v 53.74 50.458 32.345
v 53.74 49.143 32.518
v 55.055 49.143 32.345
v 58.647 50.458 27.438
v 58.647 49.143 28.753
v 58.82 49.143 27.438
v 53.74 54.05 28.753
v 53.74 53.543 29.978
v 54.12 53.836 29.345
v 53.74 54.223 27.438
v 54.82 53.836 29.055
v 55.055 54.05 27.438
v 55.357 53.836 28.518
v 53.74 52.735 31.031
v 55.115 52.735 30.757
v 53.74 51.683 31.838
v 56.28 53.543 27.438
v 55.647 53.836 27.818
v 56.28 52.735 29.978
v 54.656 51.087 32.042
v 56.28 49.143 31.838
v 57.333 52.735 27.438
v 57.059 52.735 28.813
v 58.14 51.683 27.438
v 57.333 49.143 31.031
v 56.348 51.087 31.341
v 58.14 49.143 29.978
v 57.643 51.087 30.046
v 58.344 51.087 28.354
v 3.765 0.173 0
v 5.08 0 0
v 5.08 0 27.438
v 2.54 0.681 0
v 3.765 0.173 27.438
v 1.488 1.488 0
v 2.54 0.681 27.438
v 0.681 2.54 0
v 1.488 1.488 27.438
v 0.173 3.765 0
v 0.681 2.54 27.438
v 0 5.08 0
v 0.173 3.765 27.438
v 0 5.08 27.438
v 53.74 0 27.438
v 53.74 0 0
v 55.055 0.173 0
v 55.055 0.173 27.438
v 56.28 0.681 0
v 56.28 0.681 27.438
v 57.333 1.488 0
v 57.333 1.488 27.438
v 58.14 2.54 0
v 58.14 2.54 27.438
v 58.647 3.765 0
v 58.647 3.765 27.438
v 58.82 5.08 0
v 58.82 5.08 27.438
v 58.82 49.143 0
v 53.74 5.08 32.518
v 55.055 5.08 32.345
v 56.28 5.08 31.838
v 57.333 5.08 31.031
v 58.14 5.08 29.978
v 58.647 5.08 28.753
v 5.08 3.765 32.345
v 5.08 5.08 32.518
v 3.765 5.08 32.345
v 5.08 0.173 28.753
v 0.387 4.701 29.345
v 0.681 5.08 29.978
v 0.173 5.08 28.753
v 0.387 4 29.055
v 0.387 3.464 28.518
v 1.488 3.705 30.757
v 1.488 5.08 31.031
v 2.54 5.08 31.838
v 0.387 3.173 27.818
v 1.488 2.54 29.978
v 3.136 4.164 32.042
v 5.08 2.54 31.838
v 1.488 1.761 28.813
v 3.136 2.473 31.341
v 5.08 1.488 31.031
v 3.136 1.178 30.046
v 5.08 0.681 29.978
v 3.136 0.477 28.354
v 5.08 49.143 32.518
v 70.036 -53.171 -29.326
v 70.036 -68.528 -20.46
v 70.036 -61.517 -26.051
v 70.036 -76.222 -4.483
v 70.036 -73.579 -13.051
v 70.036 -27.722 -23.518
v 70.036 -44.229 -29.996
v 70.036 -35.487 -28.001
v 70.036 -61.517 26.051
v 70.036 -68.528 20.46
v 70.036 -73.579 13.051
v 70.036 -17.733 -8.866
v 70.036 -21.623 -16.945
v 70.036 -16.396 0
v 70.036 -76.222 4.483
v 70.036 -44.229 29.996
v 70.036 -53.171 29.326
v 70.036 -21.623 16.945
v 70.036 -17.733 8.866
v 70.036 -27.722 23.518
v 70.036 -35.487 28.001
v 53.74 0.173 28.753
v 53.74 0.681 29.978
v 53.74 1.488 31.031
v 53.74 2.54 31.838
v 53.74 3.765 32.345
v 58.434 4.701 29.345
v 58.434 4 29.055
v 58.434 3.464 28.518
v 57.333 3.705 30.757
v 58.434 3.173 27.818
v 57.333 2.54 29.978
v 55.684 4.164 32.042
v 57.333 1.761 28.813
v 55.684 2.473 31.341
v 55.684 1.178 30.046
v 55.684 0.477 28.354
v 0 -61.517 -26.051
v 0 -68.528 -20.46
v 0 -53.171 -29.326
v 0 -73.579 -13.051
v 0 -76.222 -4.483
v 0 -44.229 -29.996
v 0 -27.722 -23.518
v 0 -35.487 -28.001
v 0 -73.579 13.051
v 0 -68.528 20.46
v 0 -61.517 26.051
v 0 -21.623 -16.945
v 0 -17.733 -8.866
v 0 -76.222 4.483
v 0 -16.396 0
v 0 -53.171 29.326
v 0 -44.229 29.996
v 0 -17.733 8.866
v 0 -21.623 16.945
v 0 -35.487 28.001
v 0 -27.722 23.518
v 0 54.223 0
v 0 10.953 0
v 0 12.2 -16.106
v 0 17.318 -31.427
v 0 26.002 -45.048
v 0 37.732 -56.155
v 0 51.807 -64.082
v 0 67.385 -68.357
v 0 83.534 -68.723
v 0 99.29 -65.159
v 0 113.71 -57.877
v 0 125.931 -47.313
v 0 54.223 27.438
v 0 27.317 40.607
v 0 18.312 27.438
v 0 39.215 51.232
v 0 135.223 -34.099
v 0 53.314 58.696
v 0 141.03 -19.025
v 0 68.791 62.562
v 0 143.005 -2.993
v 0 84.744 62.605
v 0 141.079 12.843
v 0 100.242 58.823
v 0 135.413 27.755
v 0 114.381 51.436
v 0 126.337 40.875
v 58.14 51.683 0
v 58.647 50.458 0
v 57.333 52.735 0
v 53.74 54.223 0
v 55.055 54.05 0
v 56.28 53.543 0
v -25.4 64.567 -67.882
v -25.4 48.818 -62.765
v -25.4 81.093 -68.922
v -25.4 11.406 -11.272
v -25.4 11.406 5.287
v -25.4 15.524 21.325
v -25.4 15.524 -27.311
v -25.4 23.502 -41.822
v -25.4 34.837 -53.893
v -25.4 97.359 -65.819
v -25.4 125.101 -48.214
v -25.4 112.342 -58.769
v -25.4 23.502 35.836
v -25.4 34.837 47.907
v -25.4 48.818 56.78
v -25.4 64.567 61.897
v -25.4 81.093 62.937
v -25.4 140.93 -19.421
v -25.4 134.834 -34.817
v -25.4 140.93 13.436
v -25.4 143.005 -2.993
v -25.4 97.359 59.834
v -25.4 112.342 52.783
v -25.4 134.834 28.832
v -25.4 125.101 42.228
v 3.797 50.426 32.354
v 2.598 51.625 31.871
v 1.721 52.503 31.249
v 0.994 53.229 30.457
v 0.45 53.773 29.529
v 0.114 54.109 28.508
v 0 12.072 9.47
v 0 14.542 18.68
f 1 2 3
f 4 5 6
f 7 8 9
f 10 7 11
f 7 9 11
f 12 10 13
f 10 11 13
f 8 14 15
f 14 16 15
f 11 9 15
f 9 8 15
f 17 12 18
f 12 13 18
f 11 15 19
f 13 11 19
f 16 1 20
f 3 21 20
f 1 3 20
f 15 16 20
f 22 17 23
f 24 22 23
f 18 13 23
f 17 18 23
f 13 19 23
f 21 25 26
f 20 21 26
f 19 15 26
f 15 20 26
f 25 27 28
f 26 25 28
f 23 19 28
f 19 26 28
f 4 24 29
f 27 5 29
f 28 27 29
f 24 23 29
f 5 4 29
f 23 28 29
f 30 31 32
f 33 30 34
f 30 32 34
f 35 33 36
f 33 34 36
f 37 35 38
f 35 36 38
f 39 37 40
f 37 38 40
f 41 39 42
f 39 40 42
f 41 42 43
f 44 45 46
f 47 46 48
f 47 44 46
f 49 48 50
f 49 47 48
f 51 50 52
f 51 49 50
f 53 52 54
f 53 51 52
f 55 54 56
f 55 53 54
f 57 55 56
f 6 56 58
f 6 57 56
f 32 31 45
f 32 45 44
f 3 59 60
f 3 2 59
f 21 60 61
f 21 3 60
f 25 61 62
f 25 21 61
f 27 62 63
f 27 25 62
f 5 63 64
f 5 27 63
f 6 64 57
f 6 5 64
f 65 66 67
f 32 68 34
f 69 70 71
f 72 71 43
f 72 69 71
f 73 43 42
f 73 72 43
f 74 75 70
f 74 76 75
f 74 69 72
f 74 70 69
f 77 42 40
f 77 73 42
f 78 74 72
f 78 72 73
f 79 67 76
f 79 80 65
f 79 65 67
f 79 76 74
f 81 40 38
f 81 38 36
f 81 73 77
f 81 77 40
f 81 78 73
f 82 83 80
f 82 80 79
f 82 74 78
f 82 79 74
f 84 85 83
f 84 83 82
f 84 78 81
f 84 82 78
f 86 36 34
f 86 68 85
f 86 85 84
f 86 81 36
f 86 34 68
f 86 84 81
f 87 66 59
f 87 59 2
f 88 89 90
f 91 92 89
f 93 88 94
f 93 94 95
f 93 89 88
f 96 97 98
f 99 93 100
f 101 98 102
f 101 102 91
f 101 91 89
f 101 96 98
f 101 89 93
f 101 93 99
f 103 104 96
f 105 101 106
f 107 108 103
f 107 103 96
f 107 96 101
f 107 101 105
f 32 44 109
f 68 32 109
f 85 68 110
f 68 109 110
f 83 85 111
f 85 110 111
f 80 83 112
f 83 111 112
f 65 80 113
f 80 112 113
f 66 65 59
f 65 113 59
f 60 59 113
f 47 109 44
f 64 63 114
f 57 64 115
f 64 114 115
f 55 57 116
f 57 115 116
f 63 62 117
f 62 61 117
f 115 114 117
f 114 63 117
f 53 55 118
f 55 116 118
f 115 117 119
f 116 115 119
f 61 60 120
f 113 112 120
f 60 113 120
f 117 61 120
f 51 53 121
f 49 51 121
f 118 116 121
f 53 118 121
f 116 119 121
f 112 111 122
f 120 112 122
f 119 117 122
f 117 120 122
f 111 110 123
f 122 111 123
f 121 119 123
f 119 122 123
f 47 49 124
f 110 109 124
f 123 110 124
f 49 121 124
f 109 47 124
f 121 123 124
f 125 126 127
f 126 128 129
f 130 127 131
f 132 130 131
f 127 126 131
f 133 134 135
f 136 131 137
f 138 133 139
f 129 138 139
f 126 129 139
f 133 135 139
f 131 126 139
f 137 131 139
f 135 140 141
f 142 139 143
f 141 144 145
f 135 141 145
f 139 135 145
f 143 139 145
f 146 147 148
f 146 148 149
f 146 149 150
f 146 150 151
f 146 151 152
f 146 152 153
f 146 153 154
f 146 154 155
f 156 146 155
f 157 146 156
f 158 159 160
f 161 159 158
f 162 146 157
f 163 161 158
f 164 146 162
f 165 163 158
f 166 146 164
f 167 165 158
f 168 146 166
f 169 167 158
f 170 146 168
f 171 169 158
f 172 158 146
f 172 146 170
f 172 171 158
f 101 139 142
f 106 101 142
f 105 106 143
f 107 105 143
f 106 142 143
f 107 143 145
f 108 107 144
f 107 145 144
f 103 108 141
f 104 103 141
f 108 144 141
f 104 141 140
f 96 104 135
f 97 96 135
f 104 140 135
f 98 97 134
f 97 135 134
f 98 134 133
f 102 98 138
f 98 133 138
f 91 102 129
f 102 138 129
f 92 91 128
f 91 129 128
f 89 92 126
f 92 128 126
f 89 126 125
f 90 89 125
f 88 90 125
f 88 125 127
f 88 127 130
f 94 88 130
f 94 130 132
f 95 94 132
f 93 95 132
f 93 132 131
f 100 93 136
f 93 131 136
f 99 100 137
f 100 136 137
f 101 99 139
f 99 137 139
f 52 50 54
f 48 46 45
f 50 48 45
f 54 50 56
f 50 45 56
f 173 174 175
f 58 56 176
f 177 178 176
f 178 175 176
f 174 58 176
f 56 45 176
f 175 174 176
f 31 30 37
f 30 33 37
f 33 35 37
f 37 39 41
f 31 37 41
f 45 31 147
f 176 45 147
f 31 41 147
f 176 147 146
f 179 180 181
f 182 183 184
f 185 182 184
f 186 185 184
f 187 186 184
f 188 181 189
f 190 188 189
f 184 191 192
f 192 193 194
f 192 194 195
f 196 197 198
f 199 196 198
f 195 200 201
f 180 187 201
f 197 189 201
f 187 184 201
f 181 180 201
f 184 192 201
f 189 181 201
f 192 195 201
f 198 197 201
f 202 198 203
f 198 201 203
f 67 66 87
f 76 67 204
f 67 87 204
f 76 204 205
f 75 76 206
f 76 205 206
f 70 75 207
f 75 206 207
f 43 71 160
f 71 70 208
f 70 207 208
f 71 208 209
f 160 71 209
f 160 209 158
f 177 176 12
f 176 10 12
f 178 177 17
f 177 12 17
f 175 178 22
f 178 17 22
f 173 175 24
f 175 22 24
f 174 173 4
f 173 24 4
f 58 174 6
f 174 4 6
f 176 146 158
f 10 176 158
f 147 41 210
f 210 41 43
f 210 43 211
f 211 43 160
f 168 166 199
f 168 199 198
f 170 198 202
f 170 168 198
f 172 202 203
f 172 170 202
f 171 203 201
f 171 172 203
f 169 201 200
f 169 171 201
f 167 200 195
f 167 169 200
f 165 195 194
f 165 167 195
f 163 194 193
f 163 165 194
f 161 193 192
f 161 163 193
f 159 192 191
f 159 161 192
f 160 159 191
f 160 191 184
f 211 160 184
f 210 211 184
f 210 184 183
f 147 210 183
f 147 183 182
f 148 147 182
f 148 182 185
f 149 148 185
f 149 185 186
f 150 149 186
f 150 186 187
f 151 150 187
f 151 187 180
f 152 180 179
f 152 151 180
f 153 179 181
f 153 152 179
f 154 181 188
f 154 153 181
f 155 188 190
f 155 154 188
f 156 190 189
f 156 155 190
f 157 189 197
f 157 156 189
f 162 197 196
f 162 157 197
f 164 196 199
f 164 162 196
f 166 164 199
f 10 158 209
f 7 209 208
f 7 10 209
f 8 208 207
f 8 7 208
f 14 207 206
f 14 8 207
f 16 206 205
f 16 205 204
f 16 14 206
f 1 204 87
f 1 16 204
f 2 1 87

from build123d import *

# Parameters (mm, degrees)
F0_W     = 54.223113
F0_H     = 32.518405
F1_DEPTH = 58.82041
F2_R     = 5.08
F3_R     = 30.080607
F4_DEPTH = 70.0362
F5_R     = 66.059765
F6_DEPTH = 25.4


with BuildPart() as f1:
    # F0 (on Right) → F1 (new body)
    with BuildSketch(Plane.YZ):
        with Locations((27.111556, 16.259203)):
            Rectangle(F0_W, F0_H)
    extrude(amount=F1_DEPTH)

    # F2
    f2_edges = [f1.edges().sort_by_distance(p)[0] for p in [
        (29.410205, 0, 32.518405),
        (58.82041, 27.111556, 32.518405),
        (29.410205, 54.223113, 32.518405),
        (0, 27.111556, 32.518405),
        (58.82041, 0, 16.259203),
        (58.82041, 54.223113, 16.259203),
        (0, 0, 16.259203),
    ]]
    fillet(f2_edges, radius=F2_R)

    # F5 (on Right) → F6 (join)
    with BuildSketch(Plane.YZ):
        with Locations((76.945178, -2.992762)):
            Circle(F5_R)
    extrude(amount=-F6_DEPTH)


with BuildPart() as f4:
    # F3 (on Right) → F4 (new body)
    with BuildSketch(Plane.YZ):
        with Locations((-46.47696, 0)):
            Circle(F3_R)
    extrude(amount=F4_DEPTH)


solid = Compound([f1.part, f4.part])
